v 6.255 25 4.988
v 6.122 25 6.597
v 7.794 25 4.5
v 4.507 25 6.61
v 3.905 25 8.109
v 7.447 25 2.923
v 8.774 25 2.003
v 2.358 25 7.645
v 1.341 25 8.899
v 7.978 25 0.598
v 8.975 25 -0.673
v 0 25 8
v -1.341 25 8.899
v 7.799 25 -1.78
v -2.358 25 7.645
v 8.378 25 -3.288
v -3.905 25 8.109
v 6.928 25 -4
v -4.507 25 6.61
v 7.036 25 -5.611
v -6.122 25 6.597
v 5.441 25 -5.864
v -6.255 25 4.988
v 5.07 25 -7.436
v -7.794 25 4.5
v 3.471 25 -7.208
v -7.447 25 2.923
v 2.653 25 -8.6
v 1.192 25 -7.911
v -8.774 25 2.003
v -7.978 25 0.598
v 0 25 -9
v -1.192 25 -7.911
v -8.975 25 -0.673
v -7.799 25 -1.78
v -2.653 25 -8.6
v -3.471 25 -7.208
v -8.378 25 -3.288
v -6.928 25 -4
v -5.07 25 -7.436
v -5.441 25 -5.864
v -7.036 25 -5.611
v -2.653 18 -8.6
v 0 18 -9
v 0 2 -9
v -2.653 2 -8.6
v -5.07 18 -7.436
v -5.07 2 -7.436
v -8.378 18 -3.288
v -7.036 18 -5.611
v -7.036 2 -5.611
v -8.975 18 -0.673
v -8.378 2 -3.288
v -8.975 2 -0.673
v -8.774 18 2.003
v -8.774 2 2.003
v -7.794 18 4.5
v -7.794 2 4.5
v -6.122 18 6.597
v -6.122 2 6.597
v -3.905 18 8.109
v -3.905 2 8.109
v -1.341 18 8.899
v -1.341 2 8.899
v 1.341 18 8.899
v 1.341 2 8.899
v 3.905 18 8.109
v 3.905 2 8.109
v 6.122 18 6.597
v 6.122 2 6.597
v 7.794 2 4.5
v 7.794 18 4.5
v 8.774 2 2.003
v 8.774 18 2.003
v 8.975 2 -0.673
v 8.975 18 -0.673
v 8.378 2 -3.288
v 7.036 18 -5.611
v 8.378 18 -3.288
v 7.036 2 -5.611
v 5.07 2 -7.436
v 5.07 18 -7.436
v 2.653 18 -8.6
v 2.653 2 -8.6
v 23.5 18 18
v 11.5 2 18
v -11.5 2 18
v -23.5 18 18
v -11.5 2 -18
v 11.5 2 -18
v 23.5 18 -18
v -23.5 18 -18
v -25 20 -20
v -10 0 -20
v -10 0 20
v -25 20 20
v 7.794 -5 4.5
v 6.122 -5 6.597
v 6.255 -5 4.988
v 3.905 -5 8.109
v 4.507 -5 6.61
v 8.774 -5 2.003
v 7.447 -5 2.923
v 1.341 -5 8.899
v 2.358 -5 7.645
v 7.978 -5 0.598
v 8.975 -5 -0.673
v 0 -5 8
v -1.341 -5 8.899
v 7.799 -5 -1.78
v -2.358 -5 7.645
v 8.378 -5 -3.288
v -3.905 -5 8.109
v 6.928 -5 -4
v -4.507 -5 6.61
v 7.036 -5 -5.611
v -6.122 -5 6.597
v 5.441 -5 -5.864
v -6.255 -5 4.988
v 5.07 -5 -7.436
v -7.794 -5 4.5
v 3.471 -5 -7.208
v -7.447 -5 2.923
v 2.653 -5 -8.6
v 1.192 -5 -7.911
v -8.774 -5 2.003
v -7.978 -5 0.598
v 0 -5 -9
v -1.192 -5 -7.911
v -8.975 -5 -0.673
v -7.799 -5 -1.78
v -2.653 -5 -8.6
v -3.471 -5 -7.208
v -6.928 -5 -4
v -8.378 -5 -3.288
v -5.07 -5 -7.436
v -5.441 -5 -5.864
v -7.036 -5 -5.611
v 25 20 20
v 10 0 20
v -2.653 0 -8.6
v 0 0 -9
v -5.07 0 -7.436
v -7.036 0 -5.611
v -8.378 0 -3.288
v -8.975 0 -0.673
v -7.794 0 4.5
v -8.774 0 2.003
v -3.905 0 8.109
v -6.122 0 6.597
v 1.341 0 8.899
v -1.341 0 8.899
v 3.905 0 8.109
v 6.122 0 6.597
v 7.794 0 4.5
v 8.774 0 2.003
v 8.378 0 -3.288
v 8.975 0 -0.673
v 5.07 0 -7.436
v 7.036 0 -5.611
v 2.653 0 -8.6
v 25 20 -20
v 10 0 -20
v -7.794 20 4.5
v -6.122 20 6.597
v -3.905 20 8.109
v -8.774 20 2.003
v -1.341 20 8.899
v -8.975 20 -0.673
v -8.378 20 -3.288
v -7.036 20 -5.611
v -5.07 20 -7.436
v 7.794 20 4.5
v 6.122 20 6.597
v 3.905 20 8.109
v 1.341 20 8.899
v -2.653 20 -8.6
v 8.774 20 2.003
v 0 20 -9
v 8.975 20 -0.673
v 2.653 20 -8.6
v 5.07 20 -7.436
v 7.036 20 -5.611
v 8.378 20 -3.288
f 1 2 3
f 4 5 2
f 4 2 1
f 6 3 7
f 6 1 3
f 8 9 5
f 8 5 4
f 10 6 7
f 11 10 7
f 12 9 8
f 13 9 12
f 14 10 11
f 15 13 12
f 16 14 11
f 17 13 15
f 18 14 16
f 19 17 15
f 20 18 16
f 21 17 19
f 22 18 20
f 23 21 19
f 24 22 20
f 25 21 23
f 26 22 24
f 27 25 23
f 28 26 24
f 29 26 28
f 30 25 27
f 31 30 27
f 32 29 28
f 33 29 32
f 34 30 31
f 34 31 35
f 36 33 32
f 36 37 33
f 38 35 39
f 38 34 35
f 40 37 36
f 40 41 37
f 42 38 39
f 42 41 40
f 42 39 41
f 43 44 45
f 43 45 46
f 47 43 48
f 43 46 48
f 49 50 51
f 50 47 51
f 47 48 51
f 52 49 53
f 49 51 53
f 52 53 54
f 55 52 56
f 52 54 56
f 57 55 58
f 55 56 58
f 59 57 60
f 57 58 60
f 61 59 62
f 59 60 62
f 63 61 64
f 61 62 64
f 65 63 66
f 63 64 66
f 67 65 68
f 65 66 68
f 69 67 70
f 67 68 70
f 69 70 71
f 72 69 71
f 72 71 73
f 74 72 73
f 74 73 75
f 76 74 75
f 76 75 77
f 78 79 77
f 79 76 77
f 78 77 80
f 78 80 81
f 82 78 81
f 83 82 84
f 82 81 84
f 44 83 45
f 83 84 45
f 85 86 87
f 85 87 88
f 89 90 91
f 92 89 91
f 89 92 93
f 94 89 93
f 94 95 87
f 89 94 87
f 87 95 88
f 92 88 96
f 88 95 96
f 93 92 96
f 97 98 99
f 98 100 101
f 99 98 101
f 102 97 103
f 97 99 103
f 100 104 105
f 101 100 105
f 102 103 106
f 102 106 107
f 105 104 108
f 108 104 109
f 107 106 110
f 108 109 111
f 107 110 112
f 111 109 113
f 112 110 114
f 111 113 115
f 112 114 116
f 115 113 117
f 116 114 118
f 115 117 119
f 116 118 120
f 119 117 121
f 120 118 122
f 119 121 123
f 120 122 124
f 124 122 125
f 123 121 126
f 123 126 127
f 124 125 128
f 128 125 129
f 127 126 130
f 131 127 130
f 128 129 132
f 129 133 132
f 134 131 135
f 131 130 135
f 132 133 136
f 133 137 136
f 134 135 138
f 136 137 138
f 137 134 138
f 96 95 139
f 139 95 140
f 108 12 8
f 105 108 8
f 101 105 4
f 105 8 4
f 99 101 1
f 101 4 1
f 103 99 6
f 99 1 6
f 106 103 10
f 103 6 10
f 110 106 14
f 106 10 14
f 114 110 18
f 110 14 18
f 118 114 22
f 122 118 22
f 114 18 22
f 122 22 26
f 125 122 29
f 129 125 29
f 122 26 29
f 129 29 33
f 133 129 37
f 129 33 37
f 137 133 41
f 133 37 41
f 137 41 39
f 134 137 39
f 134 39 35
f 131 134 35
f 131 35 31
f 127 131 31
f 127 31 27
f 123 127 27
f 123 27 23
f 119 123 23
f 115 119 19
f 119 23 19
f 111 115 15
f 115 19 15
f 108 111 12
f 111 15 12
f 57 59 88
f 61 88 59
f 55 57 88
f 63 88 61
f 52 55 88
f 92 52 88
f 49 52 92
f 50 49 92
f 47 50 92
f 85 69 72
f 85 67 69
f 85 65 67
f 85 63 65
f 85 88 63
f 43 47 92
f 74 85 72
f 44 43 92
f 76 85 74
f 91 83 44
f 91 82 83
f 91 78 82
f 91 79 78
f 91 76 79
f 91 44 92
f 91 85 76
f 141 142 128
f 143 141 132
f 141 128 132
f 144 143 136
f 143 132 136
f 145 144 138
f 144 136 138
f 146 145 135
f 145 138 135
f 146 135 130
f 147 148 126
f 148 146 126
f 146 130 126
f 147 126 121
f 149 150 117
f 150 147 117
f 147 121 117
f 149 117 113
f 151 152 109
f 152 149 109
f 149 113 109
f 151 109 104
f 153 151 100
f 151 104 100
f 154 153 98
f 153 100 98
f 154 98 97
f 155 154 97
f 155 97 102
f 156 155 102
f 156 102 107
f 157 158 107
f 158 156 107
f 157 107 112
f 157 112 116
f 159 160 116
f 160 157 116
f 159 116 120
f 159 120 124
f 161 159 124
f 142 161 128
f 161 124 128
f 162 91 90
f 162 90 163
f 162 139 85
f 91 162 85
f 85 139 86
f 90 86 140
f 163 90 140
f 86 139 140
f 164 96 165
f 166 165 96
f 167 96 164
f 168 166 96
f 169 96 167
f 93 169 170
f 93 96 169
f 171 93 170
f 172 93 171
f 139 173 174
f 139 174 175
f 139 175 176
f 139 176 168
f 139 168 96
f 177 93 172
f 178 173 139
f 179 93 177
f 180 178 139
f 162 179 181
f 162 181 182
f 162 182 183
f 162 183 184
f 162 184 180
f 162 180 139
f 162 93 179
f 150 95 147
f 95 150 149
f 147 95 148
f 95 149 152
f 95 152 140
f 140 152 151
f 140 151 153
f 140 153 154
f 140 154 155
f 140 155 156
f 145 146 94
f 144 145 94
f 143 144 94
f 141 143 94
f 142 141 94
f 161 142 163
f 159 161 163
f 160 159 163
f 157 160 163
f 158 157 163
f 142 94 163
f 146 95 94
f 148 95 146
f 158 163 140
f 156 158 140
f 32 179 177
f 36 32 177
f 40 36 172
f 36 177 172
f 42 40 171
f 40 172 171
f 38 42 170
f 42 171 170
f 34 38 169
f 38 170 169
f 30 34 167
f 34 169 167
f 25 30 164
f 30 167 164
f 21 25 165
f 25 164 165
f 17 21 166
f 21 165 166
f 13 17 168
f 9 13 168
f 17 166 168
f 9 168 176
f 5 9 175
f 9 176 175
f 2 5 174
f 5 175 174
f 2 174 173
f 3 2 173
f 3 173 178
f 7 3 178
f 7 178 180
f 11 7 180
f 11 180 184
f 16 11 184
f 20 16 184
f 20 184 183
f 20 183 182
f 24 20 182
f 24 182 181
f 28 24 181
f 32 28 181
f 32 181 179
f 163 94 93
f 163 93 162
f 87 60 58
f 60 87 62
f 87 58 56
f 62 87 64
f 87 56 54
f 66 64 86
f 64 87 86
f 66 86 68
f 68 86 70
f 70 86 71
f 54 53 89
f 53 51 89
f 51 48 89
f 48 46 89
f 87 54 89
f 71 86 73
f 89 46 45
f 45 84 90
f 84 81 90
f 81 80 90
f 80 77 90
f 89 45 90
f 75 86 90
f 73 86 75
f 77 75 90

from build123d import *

# Parameters (mm, degrees)
SKETCH1_W                = 50
SKETCH1_H                = 40
BOSS_EXTRUDE1_DEPTH      = 20
SKETCH2_W                = 36
SKETCH2_H                = 16
CUT_EXTRUDE1_DEPTH       = 50
CUT_EXTRUDE2_REACH       = 53.235
BOSS_EXTRUDE2_DEPTH      = 5
BOSS_EXTRUDE2_DEPTH_BACK = 25
SKETCH5_R                = 9
BOSS_EXTRUDE3_START      = -19
SKETCH8_R                = 9
BOSS_EXTRUDE3_DEPTH      = 19
SKETCH9_R                = 8
CUT_EXTRUDE4_DEPTH       = 30


with BuildPart() as part:
    # Sketch1 → Boss-Extrude1 (new body)
    with BuildSketch(Plane(origin=(0, 0, 0), x_dir=(1, 0, 0), z_dir=(0, 1, 0))):
        Rectangle(SKETCH1_W, SKETCH1_H)
    extrude(amount=BOSS_EXTRUDE1_DEPTH)

    # Sketch2 → Cut-Extrude1 (cut)
    with BuildSketch(Plane(origin=(25, 0, 0), x_dir=(0, 0, -1), z_dir=(1, 0, 0))):
        with Locations((0, 10)):
            Rectangle(SKETCH2_W, SKETCH2_H)
    extrude(amount=-CUT_EXTRUDE1_DEPTH, mode=Mode.SUBTRACT)

    # Cut-Extrude2: up to this face of the body (flat: up to its plane)
    cut_extrude2_end = Plane(part.part.faces().sort_by_distance((0, 10, -20))[0])
    # Sketch3 → Cut-Extrude2 (cut, up to the picked face)
    with BuildSketch(Plane.XY.offset(20), mode=Mode.PRIVATE) as cut_extrude2_sk1:
        Polygon((25, 0), (25, 20), (10, 0), align=None)
    cut_extrude2_tool1 = split(extrude(cut_extrude2_sk1.sketch, amount=-CUT_EXTRUDE2_REACH, mode=Mode.PRIVATE), bisect_by=cut_extrude2_end, keep=Keep.BOTH, mode=Mode.PRIVATE)
    # Sketch3 → Cut-Extrude2 (cut, up to the picked face)
    with BuildSketch(Plane.XY.offset(20), mode=Mode.PRIVATE) as cut_extrude2_sk2:
        Polygon((-10, 0), (-25, 20), (-25, 0), align=None)
    cut_extrude2_tool2 = split(extrude(cut_extrude2_sk2.sketch, amount=-CUT_EXTRUDE2_REACH, mode=Mode.PRIVATE), bisect_by=cut_extrude2_end, keep=Keep.BOTH, mode=Mode.PRIVATE)
    add(cut_extrude2_tool1.solids().sort_by(Axis((20, 6.666667, 20), (0, 0, -1)))[0], mode=Mode.SUBTRACT)
    add(cut_extrude2_tool2.solids().sort_by(Axis((-20, 6.666667, 20), (0, 0, -1)))[0], mode=Mode.SUBTRACT)

    # Sketch5 → Boss-Extrude2 (add, two sides: drawn at the far end of the back side and taken through both)
    with BuildSketch(Plane(origin=(0, 20, 0), x_dir=(1, 0, 0), z_dir=(0, 1, 0)).offset(-BOSS_EXTRUDE2_DEPTH_BACK)):
        with Locations(Location((0, 0, 0), (0, 0, 90))):
            Circle(SKETCH5_R)
    extrude(amount=BOSS_EXTRUDE2_DEPTH + BOSS_EXTRUDE2_DEPTH_BACK)

    # Sketch8 → Boss-Extrude3 (add)
    with BuildSketch(Plane(origin=(0, -5, 0), x_dir=(-1, 0, 0), z_dir=(0, -1, 0)).offset(BOSS_EXTRUDE3_START)):
        with Locations(Location((0, 0, 0), (0, 0, 90))):
            Circle(SKETCH8_R)
    extrude(amount=BOSS_EXTRUDE3_DEPTH)

    # Sketch9 → Cut-Extrude4 (cut)
    with BuildSketch(Plane(origin=(0, 25, 0), x_dir=(1, 0, 0), z_dir=(0, 1, 0))):
        with Locations(Location((0, 0, 0), (0, 0, 270))):
            Circle(SKETCH9_R)
    extrude(amount=-CUT_EXTRUDE4_DEPTH, mode=Mode.SUBTRACT)


solid = part.part
